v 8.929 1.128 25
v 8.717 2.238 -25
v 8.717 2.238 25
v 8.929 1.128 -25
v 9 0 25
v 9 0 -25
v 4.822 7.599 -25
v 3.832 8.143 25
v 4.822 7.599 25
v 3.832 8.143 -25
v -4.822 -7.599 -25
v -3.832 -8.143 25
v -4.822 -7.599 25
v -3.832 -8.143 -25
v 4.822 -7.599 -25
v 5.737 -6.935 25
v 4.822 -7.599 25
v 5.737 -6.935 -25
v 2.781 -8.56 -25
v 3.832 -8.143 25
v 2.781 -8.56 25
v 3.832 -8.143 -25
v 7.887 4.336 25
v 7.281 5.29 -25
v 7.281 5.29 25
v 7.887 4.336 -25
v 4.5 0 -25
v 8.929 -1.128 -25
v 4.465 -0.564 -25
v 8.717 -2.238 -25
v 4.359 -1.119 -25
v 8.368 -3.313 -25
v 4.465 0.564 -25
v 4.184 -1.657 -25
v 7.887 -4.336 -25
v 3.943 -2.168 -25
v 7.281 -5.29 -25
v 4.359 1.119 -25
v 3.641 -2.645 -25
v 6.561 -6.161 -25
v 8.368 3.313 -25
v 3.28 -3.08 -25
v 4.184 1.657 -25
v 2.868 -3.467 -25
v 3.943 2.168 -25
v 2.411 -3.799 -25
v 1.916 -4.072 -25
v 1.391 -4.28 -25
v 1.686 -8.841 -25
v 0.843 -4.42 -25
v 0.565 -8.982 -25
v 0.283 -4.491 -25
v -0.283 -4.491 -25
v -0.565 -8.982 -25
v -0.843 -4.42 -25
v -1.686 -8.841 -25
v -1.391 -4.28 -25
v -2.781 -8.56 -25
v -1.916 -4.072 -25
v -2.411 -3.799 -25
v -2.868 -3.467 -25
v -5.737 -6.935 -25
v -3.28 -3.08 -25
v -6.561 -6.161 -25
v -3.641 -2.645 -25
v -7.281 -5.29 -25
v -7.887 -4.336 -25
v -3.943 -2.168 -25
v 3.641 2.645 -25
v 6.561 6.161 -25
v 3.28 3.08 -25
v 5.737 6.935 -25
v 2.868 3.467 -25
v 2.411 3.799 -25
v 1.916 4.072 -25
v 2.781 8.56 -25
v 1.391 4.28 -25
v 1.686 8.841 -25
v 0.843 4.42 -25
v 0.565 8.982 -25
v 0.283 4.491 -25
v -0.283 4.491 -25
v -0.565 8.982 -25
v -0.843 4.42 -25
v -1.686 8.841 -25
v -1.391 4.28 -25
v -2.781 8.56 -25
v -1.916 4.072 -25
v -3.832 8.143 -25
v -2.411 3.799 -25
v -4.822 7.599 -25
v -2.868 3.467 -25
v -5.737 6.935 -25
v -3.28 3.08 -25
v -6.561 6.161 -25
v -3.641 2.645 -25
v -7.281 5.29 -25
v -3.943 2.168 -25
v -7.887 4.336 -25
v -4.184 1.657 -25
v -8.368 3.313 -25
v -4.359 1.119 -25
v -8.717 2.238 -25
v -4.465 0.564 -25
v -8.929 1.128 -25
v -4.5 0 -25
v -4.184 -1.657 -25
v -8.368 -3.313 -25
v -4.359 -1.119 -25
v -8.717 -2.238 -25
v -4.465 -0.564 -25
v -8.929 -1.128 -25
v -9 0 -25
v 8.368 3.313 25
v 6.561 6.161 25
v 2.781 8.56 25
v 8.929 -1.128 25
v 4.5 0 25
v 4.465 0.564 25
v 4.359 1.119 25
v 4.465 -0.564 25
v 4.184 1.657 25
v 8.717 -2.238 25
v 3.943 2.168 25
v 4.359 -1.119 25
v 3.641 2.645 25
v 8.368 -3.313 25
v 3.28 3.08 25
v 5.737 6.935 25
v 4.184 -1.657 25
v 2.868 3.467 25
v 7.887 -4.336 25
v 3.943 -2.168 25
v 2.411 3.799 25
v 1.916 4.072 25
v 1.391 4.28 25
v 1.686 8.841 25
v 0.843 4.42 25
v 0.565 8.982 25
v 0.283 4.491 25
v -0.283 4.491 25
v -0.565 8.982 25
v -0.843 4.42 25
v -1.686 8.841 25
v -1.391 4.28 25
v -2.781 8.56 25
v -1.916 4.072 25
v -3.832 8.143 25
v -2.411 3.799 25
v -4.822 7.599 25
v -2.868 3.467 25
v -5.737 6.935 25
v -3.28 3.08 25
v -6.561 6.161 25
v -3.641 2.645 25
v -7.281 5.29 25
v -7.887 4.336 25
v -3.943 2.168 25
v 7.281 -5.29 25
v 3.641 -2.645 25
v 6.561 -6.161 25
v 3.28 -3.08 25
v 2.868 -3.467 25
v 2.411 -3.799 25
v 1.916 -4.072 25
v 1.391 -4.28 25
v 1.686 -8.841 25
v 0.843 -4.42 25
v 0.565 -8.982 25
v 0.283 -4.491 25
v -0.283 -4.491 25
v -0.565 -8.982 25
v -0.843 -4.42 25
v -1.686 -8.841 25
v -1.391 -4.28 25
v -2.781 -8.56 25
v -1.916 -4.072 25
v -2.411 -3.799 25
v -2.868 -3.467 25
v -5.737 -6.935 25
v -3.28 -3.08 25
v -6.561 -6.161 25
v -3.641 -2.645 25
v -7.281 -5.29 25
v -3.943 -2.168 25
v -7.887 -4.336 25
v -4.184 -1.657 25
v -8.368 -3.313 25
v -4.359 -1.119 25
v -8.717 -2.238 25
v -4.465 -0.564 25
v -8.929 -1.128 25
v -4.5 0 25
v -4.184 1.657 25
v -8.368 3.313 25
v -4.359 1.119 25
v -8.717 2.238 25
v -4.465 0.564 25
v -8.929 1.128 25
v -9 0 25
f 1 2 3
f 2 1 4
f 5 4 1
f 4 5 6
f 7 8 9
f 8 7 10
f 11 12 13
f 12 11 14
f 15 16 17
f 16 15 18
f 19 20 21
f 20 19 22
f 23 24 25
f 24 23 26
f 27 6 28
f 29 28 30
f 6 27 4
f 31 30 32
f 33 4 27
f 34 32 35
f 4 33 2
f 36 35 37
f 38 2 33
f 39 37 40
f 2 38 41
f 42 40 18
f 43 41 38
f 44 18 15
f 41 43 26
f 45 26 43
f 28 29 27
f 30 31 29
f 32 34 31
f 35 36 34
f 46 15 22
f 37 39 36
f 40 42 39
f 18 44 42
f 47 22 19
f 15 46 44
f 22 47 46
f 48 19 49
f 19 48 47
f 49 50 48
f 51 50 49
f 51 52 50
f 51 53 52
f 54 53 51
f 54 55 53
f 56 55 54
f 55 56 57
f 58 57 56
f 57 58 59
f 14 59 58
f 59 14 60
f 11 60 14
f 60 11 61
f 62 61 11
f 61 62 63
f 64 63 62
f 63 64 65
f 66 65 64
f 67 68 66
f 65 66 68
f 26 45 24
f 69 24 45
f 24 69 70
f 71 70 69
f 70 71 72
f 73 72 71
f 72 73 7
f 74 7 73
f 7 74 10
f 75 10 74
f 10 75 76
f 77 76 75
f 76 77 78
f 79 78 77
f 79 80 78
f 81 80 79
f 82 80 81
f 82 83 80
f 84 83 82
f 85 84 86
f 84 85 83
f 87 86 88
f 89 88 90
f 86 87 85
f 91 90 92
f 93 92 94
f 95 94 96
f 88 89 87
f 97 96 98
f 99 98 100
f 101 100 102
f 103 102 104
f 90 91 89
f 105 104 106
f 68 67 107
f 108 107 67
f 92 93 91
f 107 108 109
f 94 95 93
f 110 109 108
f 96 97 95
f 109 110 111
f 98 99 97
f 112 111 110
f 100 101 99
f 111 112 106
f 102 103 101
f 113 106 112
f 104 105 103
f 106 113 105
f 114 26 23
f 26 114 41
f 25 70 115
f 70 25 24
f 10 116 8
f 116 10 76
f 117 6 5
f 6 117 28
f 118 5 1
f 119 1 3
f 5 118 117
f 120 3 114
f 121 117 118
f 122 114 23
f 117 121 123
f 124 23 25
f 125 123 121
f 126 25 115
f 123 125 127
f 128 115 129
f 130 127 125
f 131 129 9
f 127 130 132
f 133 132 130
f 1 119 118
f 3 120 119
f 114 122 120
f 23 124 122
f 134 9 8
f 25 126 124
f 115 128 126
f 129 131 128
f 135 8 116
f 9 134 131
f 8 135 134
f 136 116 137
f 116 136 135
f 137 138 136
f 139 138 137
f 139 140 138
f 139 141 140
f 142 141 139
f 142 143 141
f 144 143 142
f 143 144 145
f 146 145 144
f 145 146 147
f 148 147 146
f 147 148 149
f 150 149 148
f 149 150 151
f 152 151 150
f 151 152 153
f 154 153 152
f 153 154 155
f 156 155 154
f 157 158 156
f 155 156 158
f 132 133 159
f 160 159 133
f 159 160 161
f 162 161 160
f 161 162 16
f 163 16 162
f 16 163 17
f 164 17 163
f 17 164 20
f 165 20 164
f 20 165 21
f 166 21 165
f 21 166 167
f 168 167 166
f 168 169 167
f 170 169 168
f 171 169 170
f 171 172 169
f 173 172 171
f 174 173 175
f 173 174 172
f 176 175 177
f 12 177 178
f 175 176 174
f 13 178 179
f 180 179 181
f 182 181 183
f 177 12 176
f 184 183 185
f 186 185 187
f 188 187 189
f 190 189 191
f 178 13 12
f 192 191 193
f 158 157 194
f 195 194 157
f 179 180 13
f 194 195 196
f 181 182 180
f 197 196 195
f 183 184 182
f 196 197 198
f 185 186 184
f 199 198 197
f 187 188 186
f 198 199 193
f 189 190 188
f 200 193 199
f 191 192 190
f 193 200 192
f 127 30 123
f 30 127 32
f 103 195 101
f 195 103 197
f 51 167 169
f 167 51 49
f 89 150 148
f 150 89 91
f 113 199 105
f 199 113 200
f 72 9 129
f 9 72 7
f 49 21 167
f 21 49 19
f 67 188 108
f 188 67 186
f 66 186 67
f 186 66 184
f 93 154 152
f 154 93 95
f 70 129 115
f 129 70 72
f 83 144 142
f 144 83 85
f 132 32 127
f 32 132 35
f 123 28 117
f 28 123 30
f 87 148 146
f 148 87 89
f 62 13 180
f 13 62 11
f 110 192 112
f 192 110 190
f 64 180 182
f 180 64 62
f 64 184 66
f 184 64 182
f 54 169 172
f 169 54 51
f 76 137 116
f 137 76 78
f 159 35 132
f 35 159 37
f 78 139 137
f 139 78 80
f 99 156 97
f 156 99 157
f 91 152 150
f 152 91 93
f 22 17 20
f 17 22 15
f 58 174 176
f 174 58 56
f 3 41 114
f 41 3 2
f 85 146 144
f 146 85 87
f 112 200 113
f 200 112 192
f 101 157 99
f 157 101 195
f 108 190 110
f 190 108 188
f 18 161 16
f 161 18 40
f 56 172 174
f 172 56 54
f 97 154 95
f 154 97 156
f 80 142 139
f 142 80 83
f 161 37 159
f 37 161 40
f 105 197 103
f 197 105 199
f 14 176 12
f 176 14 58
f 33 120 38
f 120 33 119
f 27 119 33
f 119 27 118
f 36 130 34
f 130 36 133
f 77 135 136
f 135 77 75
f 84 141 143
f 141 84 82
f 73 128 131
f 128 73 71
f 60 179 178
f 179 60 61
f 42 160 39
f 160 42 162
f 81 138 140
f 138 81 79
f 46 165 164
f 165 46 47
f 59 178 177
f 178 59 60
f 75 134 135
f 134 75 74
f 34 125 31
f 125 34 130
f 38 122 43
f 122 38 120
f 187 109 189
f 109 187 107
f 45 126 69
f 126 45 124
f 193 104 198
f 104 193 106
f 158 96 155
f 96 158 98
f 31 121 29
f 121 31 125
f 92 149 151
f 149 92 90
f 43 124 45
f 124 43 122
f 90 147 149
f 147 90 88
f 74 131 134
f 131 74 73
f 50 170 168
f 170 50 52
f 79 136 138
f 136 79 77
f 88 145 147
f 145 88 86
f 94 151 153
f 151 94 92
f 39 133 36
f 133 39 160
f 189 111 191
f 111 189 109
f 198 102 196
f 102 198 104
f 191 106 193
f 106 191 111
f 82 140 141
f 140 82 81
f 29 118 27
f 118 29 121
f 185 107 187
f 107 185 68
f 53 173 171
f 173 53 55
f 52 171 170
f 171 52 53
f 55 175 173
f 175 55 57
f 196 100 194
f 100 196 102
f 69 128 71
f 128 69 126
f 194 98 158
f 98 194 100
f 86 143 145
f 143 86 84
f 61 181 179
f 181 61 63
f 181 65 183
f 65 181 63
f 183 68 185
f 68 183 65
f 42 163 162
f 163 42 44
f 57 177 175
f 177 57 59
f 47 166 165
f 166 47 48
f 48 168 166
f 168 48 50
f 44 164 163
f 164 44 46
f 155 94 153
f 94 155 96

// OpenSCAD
$fn = 50;


difference() {
	union() {
		translate(v = [0, 0, -25.0000000000]) {
			cylinder(h = 50, r = 9.0000000000);
		}
	}
	union() {
		translate(v = [0, 0, -100.0000000000]) {
			cylinder(h = 200, r = 4.5000000000);
		}
	}
}
